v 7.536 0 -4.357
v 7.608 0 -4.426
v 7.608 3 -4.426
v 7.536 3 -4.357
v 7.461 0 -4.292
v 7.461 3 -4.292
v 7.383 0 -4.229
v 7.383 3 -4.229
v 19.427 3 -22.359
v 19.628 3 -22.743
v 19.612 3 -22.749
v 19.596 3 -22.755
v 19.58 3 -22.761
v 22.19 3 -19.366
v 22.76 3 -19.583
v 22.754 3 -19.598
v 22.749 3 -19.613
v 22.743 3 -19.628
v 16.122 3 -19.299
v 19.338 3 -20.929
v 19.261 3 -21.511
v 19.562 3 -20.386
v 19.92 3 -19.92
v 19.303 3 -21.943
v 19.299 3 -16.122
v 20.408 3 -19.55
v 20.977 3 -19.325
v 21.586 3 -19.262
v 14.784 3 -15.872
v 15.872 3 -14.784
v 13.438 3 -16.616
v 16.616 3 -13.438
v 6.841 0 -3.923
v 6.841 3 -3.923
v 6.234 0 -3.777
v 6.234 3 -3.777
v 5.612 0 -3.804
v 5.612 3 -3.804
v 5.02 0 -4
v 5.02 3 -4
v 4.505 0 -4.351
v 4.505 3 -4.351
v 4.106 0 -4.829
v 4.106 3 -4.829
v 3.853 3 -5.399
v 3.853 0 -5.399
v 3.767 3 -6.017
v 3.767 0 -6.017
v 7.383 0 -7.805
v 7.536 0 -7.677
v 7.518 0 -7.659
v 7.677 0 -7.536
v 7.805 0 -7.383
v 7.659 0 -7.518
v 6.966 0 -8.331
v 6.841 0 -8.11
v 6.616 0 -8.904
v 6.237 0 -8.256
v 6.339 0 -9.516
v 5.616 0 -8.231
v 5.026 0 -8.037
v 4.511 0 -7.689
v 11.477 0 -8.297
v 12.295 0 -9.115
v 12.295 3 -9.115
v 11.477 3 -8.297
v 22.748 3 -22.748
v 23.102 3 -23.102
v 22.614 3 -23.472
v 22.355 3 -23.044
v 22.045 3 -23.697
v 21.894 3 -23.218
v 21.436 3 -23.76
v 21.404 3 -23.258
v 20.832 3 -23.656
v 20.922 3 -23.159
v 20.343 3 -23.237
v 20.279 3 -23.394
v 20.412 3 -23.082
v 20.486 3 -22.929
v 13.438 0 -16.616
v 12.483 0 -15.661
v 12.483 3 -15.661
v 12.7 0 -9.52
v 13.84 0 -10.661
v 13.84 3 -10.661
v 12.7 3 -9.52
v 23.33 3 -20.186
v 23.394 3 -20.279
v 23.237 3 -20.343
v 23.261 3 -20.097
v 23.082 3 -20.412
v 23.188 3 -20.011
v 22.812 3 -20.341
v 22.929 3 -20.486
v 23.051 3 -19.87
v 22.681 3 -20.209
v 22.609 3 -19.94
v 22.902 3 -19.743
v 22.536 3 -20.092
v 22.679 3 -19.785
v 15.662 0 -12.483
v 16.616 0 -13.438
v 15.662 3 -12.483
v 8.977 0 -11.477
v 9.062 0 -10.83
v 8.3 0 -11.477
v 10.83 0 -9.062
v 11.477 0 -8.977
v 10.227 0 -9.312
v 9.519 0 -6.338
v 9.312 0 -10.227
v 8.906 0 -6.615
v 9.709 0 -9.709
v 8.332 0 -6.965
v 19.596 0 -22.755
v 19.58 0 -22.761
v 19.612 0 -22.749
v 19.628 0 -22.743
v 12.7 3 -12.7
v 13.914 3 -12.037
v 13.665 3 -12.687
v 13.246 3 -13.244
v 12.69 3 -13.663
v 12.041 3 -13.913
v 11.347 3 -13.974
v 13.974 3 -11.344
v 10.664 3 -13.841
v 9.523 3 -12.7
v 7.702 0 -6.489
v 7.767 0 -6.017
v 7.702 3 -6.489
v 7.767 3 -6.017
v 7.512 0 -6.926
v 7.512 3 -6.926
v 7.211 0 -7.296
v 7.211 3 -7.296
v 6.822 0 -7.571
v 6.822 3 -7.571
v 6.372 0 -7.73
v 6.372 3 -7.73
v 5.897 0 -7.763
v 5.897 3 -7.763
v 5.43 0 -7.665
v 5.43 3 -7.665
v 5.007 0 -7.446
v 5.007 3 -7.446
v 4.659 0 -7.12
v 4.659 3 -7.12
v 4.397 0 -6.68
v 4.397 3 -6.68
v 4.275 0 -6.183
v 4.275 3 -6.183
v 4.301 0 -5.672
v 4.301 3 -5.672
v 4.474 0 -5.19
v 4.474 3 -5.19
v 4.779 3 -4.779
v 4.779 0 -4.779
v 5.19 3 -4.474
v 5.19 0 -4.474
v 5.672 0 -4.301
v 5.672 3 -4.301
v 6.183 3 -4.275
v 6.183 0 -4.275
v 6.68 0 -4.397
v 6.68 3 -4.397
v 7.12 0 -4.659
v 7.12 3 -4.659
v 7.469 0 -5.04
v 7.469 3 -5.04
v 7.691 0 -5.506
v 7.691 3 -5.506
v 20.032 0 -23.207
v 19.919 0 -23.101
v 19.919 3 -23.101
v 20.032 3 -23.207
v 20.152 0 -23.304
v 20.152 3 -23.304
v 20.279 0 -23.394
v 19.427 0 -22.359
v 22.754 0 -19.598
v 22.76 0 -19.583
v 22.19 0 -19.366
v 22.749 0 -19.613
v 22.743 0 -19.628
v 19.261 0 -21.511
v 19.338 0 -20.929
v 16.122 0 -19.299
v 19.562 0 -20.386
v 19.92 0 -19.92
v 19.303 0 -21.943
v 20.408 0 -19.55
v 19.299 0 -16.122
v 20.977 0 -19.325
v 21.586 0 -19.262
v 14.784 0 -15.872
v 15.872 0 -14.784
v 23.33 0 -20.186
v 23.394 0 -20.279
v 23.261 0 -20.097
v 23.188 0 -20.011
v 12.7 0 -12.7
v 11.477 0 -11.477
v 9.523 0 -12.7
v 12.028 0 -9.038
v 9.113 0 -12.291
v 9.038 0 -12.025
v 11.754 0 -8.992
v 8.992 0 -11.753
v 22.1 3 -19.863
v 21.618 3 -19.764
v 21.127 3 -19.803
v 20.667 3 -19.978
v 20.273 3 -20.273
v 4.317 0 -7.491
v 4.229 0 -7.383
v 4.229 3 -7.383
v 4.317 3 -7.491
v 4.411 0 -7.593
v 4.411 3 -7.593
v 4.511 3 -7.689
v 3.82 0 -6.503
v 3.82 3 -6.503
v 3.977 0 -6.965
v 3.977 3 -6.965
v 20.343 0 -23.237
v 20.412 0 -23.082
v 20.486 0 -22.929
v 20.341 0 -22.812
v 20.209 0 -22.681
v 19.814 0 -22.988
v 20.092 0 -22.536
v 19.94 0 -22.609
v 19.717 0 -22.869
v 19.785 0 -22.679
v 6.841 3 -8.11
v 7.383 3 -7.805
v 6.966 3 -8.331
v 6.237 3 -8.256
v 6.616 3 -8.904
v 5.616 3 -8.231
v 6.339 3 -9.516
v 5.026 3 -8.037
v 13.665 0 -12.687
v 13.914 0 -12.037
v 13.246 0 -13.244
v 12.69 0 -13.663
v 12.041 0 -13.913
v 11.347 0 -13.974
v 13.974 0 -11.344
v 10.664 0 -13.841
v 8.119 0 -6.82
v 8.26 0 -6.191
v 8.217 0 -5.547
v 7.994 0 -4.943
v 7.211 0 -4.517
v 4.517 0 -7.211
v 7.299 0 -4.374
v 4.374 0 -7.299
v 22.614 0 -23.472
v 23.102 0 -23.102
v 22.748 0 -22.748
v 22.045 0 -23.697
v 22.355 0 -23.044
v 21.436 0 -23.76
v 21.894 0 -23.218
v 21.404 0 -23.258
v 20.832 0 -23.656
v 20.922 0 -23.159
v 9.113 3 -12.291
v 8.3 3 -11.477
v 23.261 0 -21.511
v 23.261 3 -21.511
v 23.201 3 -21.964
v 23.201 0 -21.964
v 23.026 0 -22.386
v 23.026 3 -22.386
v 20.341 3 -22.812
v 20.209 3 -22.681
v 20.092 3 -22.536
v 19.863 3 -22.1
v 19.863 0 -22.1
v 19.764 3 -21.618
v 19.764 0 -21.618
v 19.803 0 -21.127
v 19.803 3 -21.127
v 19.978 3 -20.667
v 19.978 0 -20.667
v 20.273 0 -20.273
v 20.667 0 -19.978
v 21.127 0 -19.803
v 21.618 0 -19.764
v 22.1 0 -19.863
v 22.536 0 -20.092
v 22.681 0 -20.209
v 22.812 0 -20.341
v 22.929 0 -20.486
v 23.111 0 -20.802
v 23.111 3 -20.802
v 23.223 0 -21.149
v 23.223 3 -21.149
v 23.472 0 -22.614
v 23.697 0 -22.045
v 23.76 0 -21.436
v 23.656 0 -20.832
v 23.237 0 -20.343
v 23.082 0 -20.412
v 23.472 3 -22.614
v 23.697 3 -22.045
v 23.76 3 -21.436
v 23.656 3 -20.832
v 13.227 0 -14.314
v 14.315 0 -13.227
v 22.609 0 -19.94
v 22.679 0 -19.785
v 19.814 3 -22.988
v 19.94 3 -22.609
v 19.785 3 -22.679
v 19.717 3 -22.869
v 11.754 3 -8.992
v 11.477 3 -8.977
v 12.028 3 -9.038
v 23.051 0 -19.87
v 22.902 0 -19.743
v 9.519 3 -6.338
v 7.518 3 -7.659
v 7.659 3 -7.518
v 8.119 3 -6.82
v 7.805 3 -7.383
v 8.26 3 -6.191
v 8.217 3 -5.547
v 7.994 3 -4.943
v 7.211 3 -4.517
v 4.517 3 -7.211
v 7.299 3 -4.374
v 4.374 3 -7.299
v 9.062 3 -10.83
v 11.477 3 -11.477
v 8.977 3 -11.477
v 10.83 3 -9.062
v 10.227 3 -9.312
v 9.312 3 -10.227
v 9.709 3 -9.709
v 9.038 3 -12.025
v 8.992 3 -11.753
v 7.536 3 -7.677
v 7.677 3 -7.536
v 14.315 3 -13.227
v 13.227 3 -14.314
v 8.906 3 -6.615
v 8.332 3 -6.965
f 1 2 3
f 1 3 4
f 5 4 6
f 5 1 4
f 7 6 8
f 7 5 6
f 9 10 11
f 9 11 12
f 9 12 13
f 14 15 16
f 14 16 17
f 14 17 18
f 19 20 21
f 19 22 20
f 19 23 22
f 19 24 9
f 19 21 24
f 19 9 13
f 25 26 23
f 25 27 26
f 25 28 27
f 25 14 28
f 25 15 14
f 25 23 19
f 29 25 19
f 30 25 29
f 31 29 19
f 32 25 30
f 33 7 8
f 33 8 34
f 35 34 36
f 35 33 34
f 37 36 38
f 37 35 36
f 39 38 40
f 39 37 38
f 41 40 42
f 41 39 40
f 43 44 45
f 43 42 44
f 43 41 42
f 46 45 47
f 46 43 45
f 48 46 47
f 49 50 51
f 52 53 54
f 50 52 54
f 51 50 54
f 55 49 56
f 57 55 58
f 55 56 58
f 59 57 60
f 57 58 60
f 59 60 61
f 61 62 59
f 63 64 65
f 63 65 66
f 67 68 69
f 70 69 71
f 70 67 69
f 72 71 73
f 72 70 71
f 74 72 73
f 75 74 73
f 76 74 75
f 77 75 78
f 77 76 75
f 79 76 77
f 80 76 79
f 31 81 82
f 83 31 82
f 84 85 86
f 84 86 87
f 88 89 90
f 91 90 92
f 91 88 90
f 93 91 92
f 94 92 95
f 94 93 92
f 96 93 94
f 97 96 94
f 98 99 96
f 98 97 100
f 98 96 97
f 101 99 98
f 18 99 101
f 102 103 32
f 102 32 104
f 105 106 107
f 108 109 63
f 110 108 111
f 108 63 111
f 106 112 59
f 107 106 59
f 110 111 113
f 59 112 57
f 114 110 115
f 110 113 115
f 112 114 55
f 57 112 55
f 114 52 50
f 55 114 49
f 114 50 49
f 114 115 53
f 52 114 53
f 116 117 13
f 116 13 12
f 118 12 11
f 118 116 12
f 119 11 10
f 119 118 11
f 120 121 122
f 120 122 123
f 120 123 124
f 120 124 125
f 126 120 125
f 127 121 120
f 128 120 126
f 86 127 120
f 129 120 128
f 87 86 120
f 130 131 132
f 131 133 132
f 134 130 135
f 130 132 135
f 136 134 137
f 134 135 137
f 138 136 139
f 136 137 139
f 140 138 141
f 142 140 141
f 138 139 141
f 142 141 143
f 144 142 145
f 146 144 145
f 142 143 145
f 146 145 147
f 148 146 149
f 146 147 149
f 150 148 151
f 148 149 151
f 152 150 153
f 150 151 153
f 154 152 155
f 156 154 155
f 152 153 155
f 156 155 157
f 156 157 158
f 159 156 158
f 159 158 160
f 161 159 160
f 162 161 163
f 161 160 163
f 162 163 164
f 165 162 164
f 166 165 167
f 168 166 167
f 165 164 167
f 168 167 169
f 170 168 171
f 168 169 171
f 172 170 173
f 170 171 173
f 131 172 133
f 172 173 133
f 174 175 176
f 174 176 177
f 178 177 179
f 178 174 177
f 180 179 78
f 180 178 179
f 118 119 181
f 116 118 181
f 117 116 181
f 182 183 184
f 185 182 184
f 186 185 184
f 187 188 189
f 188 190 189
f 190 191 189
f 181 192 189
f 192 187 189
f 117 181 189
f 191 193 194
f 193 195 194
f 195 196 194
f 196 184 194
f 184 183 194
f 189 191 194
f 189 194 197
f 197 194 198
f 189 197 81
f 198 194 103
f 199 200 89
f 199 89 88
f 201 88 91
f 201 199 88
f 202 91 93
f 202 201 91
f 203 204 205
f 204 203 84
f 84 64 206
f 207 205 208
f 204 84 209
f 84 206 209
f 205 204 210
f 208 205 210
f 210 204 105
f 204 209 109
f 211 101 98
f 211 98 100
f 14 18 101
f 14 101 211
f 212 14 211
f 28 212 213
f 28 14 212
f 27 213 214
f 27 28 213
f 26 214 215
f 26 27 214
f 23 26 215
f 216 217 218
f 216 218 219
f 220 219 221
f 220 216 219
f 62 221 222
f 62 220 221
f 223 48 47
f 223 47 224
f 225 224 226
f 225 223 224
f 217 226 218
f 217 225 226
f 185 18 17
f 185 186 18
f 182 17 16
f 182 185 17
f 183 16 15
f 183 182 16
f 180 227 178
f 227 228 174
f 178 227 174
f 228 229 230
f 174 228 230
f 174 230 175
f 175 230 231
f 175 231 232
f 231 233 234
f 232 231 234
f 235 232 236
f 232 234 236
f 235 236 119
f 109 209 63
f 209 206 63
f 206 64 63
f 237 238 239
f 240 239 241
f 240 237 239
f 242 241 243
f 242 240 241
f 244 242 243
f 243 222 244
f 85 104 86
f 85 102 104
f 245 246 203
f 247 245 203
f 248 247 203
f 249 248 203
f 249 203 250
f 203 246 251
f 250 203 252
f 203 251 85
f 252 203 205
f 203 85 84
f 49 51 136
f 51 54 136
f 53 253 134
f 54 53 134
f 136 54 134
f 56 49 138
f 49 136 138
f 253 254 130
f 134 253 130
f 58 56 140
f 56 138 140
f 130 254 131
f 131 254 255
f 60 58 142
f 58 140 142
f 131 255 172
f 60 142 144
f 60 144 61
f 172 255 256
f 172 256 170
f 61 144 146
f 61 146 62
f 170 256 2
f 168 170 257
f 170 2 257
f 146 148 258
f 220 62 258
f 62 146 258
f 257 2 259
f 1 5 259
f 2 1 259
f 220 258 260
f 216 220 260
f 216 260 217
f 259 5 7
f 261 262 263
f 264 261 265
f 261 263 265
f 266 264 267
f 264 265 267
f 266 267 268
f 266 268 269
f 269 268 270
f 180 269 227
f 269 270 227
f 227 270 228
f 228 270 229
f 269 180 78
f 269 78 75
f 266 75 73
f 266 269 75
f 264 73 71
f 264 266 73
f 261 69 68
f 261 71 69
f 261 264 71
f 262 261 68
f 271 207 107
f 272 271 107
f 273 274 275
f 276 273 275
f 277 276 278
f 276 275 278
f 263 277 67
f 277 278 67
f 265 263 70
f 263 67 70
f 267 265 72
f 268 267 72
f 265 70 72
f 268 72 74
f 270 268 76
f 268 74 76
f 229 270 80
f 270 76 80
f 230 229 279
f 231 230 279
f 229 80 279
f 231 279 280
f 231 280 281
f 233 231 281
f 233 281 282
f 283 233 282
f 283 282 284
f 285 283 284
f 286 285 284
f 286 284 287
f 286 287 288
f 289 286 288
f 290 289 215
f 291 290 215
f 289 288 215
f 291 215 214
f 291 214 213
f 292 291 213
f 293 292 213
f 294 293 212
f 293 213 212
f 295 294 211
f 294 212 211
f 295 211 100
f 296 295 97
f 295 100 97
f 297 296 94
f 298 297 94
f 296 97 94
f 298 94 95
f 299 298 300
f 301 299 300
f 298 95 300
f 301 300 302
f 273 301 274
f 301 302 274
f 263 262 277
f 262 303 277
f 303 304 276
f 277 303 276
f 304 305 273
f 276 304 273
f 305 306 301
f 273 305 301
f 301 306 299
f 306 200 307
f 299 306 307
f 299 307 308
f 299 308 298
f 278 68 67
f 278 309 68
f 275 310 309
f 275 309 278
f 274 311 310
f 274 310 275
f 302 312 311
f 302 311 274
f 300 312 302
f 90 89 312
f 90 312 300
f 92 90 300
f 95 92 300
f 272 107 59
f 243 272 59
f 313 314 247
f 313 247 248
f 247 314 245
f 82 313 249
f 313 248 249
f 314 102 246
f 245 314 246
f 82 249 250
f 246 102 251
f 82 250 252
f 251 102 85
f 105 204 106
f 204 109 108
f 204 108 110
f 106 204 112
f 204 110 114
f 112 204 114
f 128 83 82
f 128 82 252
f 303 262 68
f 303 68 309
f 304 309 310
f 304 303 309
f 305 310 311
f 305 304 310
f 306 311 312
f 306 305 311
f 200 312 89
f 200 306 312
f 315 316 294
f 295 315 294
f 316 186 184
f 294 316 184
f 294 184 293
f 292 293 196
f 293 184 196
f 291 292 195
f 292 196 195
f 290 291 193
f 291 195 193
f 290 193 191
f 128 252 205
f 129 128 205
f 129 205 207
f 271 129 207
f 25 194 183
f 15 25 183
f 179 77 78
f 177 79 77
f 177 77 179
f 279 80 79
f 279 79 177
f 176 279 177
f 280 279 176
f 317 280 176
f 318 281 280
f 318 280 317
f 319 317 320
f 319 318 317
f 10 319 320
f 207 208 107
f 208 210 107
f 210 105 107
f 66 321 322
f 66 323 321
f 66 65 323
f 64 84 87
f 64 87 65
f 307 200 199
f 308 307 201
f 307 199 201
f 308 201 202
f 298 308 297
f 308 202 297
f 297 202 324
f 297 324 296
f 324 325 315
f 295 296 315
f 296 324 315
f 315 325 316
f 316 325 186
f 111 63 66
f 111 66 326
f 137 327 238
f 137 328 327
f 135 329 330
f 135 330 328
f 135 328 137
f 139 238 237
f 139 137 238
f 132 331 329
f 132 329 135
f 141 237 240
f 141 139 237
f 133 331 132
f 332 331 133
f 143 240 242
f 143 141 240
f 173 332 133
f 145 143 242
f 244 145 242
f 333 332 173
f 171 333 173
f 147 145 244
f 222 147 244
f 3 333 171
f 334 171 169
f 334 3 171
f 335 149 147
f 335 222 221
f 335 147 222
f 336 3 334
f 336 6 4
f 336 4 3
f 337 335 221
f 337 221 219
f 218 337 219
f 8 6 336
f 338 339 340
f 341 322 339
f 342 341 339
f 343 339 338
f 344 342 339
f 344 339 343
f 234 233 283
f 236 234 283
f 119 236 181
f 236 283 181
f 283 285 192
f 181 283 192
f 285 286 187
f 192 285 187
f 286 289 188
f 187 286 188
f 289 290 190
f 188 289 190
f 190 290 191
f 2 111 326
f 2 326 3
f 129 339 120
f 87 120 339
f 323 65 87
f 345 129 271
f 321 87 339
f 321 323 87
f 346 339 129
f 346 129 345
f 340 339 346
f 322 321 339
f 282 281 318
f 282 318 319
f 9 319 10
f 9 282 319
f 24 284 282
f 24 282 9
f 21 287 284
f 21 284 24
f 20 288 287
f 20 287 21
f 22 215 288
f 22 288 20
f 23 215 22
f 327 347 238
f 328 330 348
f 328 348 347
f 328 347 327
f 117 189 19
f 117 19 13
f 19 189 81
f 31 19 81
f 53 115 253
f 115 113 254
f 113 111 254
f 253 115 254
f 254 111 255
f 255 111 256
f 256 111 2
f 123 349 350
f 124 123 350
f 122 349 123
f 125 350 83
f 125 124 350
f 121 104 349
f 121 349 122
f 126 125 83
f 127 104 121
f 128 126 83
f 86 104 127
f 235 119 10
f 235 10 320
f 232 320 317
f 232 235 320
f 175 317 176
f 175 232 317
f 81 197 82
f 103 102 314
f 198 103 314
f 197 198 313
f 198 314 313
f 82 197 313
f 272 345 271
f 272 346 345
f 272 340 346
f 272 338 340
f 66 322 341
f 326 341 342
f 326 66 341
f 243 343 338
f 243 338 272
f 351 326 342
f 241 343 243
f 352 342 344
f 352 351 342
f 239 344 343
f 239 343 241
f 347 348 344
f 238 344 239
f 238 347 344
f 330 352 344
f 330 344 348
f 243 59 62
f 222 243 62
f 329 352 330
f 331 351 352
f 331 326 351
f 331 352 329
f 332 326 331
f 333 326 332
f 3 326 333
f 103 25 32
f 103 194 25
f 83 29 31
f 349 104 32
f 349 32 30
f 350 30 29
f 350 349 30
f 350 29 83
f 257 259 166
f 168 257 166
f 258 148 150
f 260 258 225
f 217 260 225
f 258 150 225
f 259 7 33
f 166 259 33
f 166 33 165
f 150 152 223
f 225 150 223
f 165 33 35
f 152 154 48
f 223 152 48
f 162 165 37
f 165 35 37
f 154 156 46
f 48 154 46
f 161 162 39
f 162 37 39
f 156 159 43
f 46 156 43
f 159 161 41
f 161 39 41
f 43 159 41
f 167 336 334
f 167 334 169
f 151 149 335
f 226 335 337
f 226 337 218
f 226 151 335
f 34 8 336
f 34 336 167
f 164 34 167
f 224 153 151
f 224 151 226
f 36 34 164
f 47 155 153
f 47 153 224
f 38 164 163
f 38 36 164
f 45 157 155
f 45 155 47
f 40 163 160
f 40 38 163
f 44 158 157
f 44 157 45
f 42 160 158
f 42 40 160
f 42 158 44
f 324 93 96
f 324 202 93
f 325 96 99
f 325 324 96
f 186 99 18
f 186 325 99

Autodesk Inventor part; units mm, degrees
ref_plane "YZ Plane" through (0, 0, 0) normal (1, 0, 0) x (0, 1, 0)
ref_plane "XZ Plane" through (0, 0, 0) normal (0, 1, 0) x (-1, 0, 0)
ref_plane "XY Plane" through (0, 0, 0) normal (0, 0, 1) x (1, 0, 0)
sketch "Sketch1" plane through (0, 0, 0) normal (0, 1, 0) x (-1, 0, 0)
  circle A0 centre (-0.0319, -8.4999) radius 1.5
  circle A1 centre (8.4996, 0.0794) radius 1.5
  circle A2 centre (-8.4996, 0.0788) radius 1.5
  circle A3 centre (-0.0313, 8.4999) radius 1.5
  line L0 (-12.7, 12.7) -> (12.7, 12.7)
  line L1 (12.7, 12.7) -> (12.7, -12.7)
  line L2 (12.7, -12.7) -> (-12.7, -12.7)
  line L3 (-12.7, -12.7) -> (-12.7, 12.7)
  line L4 (-12.7, 12.7) -> (12.7, -12.7) construction
  line L5 (12.7, 12.7) -> (-12.7, -12.7) construction
  line L6 (-11.4771, 11.4771) -> (11.4771, 11.4771)
  line L7 (11.4771, 11.4771) -> (11.4771, -11.4771)
  line L8 (11.4771, -11.4771) -> (-11.4771, -11.4771)
  line L9 (-11.4771, -11.4771) -> (-11.4771, 11.4771)
  line L10 (-11.4771, 11.4771) -> (11.4771, -11.4771) construction
  line L11 (11.4771, 11.4771) -> (-11.4771, -11.4771) construction
  line L12 (-25.4, -25.4) -> (25.4, -25.4)
  line L13 (25.4, -25.4) -> (25.4, 25.4)
  line L14 (25.4, 25.4) -> (-25.4, 25.4)
  line L15 (-25.4, 25.4) -> (-25.4, -25.4)
  line L16 (-25.4, -25.4) -> (25.4, 25.4) construction
  line L17 (25.4, -25.4) -> (-25.4, 25.4) construction
  circle A4 centre (0, 0) radius 5.5
  circle A5 centre (11.4771, 11.4771) radius 5.5
  circle A6 centre (11.4771, -11.4771) radius 5.5
  circle A7 centre (-11.4771, 11.4771) radius 5.5
  circle A8 centre (-11.4771, -11.4771) radius 5.5
  circle A9 centre (-25.4, 25.4) radius 5.5
  circle A10 centre (25.4, 25.4) radius 5.5
  circle A11 centre (25.4, -25.4) radius 5.5
  circle A12 centre (-25.4, -25.4) radius 5.5
  line L18 (7.588, 15.3662) -> (21.5109, 29.2891)
  line L19 (29.2891, 21.5109) -> (15.3662, 7.588)
  line L20 (15.3662, -7.588) -> (29.2891, -21.5109)
  line L21 (-7.588, -15.3662) -> (-21.5109, -29.2891)
  line L22 (-29.2891, 21.5109) -> (-15.3662, 7.588)
  line L23 (7.588, -15.3662) -> (21.5109, -29.2891)
  line L24 (-15.3365, -7.5586) -> (-29.2595, -21.4815)
  line L25 (-7.6475, 15.4248) -> (-21.5108, 29.289)
  line L26 (-35, -35) -> (35, -35)
  line L27 (35, -35) -> (35, 35)
  line L28 (35, 35) -> (-35, 35)
  line L29 (-35, 35) -> (-35, -35)
  line L30 (-35, -35) -> (35, 35) construction
  line L31 (35, -35) -> (-35, 35) construction
  circle A13 centre (11.4771, 11.4771) radius 2.5
  circle A14 centre (25.4, 25.4) radius 2.5
  line L32 (27.1678, 23.6322) -> (13.2448, 9.7093)
  line L33 (23.6682, 27.203) -> (9.7093, 13.2449)
  line L34 (0, 0) -> (0, 35)
  line L35 (35, 0) -> (0, 0)
  line L36 (-27.1678, 23.6322) -> (-13.2448, 9.7093)
  circle A15 centre (-25.4, 25.4) radius 2.5
  line L37 (-23.6682, 27.203) -> (-9.7093, 13.2449)
  circle A16 centre (-11.4771, 11.4771) radius 2.5
  circle A17 centre (25.4, -25.4) radius 2.5
  line L38 (23.6682, -27.203) -> (9.7093, -13.2449)
  line L39 (27.1678, -23.6322) -> (13.2448, -9.7093)
  circle A18 centre (11.4771, -11.4771) radius 2.5
  circle A19 centre (-11.4771, -11.4771) radius 2.5
  line L40 (-23.6682, -27.203) -> (-9.7093, -13.2449)
  line L41 (-27.1678, -23.6322) -> (-13.2448, -9.7093)
  line L42 (25.4, 25.4) -> (-25.4, -25.4) construction
  circle A20 centre (-25.4, -25.4) radius 2.5
  circle A21 centre (0, 0) radius 8.509
  circle A22 centre (-6.0168, -6.0168) radius 1.5
  line L43 (-25.4, -25.4) -> (-17.6218, -17.6218)
  circle A23 centre (-17.6218, -17.6218) radius 5.5
  circle A24 centre (-6.0168, -6.0168) radius 2.25
  line L44 (-16.1218, -19.2989) -> (-4.5109, -7.6886)
  line L45 (-19.2988, -16.1217) -> (-7.6081, -4.4261)
  circle A25 centre (-21.5109, -21.5109) radius 1.5
  circle A26 centre (-21.5109, -21.5109) radius 2.25
  line L46 (-19.2988, -16.1217) -> (-23.1879, -20.0108)
  line L47 (-16.1218, -19.2989) -> (-19.9189, -23.1009)
  point P0 (-22.7602, -19.5832)
  point P1 (-22.7428, -19.6281)
  point P2 (-23.011, -19.8339)
  point P3 (-19.6281, -22.7428)
  point P4 (-19.5799, -22.7615)
  dimension "d24" = 17.018
  dimension "d0" = 8.5
  dimension "d1" = 8.5
  dimension "d2" = 8.5
  dimension "d3" = 8.5
  dimension "d4" = 3
  dimension "d5" = 3
  dimension "d6" = 3
  dimension "d7" = 3
  dimension "d8" = 25.4
  dimension "d9" = 25.4
  dimension "d10" = 50.8
  dimension "d11" = 50.8
  dimension "d12" = 11
  dimension "d13" = 11
  dimension "d14" = 11
  dimension "d15" = 11
  dimension "d16" = 11
  dimension "d17" = 11
  dimension "d18" = 11
  dimension "d19" = 11
  dimension "d20" = 11
  dimension "d21" = 70
  dimension "d22" = 5
  dimension "d23" = 5
  dimension "d25" = 3
  dimension "d26" = 11
  dimension "d28" = 4.5
  dimension "d33" = 3
  dimension "d34" = 4.5
extrude "Extrusion1" add sketch "Sketch1" along normal blind 3 contours A24 A8 A21 A22 | A21 A22 A24 | L44 A8 A24 | A24 A8 | A8 L44 L8 A19 L9 L45 A24 | A8 L45 A24 | L44 A19 L8 | A19 L44 L2 L3 L45 L9 L8 | L8 L9 A19 | L9 A19 L45 | L44 A19 L45 L3 L2 | L44 A23 L45 A19 | L44 A8 L45 A23 | L44 L47 A23 A26 L46 L45 A8 | A26 L43 A25 A12 | A12 A25 A23 A26 | A23 A25 L43 A26 | A26 A12 A25 L43 | A26 A23 A25 A12 | A26 L43 A25 A23
sketch "Sketch2" plane through (0, 3, 0) normal (0, 1, 0) x (1, 0, 0)
  circle A0 centre (6.0168, 6.0168) radius 1.5 projected
  circle A1 centre (21.5109, 21.5109) radius 1.5 projected
  circle A2 centre (6.0168, 6.0168) radius 1.75
  circle A3 centre (21.5109, 21.5109) radius 1.75
  point P0 (0, 0)
  dimension "d35" = 3.5
  dimension "d36" = 3.5
extrude "Extrusion2" cut sketch "Sketch2" against normal blind 10 contours A0 | A1 | A2 | A3
properties part number "link"
